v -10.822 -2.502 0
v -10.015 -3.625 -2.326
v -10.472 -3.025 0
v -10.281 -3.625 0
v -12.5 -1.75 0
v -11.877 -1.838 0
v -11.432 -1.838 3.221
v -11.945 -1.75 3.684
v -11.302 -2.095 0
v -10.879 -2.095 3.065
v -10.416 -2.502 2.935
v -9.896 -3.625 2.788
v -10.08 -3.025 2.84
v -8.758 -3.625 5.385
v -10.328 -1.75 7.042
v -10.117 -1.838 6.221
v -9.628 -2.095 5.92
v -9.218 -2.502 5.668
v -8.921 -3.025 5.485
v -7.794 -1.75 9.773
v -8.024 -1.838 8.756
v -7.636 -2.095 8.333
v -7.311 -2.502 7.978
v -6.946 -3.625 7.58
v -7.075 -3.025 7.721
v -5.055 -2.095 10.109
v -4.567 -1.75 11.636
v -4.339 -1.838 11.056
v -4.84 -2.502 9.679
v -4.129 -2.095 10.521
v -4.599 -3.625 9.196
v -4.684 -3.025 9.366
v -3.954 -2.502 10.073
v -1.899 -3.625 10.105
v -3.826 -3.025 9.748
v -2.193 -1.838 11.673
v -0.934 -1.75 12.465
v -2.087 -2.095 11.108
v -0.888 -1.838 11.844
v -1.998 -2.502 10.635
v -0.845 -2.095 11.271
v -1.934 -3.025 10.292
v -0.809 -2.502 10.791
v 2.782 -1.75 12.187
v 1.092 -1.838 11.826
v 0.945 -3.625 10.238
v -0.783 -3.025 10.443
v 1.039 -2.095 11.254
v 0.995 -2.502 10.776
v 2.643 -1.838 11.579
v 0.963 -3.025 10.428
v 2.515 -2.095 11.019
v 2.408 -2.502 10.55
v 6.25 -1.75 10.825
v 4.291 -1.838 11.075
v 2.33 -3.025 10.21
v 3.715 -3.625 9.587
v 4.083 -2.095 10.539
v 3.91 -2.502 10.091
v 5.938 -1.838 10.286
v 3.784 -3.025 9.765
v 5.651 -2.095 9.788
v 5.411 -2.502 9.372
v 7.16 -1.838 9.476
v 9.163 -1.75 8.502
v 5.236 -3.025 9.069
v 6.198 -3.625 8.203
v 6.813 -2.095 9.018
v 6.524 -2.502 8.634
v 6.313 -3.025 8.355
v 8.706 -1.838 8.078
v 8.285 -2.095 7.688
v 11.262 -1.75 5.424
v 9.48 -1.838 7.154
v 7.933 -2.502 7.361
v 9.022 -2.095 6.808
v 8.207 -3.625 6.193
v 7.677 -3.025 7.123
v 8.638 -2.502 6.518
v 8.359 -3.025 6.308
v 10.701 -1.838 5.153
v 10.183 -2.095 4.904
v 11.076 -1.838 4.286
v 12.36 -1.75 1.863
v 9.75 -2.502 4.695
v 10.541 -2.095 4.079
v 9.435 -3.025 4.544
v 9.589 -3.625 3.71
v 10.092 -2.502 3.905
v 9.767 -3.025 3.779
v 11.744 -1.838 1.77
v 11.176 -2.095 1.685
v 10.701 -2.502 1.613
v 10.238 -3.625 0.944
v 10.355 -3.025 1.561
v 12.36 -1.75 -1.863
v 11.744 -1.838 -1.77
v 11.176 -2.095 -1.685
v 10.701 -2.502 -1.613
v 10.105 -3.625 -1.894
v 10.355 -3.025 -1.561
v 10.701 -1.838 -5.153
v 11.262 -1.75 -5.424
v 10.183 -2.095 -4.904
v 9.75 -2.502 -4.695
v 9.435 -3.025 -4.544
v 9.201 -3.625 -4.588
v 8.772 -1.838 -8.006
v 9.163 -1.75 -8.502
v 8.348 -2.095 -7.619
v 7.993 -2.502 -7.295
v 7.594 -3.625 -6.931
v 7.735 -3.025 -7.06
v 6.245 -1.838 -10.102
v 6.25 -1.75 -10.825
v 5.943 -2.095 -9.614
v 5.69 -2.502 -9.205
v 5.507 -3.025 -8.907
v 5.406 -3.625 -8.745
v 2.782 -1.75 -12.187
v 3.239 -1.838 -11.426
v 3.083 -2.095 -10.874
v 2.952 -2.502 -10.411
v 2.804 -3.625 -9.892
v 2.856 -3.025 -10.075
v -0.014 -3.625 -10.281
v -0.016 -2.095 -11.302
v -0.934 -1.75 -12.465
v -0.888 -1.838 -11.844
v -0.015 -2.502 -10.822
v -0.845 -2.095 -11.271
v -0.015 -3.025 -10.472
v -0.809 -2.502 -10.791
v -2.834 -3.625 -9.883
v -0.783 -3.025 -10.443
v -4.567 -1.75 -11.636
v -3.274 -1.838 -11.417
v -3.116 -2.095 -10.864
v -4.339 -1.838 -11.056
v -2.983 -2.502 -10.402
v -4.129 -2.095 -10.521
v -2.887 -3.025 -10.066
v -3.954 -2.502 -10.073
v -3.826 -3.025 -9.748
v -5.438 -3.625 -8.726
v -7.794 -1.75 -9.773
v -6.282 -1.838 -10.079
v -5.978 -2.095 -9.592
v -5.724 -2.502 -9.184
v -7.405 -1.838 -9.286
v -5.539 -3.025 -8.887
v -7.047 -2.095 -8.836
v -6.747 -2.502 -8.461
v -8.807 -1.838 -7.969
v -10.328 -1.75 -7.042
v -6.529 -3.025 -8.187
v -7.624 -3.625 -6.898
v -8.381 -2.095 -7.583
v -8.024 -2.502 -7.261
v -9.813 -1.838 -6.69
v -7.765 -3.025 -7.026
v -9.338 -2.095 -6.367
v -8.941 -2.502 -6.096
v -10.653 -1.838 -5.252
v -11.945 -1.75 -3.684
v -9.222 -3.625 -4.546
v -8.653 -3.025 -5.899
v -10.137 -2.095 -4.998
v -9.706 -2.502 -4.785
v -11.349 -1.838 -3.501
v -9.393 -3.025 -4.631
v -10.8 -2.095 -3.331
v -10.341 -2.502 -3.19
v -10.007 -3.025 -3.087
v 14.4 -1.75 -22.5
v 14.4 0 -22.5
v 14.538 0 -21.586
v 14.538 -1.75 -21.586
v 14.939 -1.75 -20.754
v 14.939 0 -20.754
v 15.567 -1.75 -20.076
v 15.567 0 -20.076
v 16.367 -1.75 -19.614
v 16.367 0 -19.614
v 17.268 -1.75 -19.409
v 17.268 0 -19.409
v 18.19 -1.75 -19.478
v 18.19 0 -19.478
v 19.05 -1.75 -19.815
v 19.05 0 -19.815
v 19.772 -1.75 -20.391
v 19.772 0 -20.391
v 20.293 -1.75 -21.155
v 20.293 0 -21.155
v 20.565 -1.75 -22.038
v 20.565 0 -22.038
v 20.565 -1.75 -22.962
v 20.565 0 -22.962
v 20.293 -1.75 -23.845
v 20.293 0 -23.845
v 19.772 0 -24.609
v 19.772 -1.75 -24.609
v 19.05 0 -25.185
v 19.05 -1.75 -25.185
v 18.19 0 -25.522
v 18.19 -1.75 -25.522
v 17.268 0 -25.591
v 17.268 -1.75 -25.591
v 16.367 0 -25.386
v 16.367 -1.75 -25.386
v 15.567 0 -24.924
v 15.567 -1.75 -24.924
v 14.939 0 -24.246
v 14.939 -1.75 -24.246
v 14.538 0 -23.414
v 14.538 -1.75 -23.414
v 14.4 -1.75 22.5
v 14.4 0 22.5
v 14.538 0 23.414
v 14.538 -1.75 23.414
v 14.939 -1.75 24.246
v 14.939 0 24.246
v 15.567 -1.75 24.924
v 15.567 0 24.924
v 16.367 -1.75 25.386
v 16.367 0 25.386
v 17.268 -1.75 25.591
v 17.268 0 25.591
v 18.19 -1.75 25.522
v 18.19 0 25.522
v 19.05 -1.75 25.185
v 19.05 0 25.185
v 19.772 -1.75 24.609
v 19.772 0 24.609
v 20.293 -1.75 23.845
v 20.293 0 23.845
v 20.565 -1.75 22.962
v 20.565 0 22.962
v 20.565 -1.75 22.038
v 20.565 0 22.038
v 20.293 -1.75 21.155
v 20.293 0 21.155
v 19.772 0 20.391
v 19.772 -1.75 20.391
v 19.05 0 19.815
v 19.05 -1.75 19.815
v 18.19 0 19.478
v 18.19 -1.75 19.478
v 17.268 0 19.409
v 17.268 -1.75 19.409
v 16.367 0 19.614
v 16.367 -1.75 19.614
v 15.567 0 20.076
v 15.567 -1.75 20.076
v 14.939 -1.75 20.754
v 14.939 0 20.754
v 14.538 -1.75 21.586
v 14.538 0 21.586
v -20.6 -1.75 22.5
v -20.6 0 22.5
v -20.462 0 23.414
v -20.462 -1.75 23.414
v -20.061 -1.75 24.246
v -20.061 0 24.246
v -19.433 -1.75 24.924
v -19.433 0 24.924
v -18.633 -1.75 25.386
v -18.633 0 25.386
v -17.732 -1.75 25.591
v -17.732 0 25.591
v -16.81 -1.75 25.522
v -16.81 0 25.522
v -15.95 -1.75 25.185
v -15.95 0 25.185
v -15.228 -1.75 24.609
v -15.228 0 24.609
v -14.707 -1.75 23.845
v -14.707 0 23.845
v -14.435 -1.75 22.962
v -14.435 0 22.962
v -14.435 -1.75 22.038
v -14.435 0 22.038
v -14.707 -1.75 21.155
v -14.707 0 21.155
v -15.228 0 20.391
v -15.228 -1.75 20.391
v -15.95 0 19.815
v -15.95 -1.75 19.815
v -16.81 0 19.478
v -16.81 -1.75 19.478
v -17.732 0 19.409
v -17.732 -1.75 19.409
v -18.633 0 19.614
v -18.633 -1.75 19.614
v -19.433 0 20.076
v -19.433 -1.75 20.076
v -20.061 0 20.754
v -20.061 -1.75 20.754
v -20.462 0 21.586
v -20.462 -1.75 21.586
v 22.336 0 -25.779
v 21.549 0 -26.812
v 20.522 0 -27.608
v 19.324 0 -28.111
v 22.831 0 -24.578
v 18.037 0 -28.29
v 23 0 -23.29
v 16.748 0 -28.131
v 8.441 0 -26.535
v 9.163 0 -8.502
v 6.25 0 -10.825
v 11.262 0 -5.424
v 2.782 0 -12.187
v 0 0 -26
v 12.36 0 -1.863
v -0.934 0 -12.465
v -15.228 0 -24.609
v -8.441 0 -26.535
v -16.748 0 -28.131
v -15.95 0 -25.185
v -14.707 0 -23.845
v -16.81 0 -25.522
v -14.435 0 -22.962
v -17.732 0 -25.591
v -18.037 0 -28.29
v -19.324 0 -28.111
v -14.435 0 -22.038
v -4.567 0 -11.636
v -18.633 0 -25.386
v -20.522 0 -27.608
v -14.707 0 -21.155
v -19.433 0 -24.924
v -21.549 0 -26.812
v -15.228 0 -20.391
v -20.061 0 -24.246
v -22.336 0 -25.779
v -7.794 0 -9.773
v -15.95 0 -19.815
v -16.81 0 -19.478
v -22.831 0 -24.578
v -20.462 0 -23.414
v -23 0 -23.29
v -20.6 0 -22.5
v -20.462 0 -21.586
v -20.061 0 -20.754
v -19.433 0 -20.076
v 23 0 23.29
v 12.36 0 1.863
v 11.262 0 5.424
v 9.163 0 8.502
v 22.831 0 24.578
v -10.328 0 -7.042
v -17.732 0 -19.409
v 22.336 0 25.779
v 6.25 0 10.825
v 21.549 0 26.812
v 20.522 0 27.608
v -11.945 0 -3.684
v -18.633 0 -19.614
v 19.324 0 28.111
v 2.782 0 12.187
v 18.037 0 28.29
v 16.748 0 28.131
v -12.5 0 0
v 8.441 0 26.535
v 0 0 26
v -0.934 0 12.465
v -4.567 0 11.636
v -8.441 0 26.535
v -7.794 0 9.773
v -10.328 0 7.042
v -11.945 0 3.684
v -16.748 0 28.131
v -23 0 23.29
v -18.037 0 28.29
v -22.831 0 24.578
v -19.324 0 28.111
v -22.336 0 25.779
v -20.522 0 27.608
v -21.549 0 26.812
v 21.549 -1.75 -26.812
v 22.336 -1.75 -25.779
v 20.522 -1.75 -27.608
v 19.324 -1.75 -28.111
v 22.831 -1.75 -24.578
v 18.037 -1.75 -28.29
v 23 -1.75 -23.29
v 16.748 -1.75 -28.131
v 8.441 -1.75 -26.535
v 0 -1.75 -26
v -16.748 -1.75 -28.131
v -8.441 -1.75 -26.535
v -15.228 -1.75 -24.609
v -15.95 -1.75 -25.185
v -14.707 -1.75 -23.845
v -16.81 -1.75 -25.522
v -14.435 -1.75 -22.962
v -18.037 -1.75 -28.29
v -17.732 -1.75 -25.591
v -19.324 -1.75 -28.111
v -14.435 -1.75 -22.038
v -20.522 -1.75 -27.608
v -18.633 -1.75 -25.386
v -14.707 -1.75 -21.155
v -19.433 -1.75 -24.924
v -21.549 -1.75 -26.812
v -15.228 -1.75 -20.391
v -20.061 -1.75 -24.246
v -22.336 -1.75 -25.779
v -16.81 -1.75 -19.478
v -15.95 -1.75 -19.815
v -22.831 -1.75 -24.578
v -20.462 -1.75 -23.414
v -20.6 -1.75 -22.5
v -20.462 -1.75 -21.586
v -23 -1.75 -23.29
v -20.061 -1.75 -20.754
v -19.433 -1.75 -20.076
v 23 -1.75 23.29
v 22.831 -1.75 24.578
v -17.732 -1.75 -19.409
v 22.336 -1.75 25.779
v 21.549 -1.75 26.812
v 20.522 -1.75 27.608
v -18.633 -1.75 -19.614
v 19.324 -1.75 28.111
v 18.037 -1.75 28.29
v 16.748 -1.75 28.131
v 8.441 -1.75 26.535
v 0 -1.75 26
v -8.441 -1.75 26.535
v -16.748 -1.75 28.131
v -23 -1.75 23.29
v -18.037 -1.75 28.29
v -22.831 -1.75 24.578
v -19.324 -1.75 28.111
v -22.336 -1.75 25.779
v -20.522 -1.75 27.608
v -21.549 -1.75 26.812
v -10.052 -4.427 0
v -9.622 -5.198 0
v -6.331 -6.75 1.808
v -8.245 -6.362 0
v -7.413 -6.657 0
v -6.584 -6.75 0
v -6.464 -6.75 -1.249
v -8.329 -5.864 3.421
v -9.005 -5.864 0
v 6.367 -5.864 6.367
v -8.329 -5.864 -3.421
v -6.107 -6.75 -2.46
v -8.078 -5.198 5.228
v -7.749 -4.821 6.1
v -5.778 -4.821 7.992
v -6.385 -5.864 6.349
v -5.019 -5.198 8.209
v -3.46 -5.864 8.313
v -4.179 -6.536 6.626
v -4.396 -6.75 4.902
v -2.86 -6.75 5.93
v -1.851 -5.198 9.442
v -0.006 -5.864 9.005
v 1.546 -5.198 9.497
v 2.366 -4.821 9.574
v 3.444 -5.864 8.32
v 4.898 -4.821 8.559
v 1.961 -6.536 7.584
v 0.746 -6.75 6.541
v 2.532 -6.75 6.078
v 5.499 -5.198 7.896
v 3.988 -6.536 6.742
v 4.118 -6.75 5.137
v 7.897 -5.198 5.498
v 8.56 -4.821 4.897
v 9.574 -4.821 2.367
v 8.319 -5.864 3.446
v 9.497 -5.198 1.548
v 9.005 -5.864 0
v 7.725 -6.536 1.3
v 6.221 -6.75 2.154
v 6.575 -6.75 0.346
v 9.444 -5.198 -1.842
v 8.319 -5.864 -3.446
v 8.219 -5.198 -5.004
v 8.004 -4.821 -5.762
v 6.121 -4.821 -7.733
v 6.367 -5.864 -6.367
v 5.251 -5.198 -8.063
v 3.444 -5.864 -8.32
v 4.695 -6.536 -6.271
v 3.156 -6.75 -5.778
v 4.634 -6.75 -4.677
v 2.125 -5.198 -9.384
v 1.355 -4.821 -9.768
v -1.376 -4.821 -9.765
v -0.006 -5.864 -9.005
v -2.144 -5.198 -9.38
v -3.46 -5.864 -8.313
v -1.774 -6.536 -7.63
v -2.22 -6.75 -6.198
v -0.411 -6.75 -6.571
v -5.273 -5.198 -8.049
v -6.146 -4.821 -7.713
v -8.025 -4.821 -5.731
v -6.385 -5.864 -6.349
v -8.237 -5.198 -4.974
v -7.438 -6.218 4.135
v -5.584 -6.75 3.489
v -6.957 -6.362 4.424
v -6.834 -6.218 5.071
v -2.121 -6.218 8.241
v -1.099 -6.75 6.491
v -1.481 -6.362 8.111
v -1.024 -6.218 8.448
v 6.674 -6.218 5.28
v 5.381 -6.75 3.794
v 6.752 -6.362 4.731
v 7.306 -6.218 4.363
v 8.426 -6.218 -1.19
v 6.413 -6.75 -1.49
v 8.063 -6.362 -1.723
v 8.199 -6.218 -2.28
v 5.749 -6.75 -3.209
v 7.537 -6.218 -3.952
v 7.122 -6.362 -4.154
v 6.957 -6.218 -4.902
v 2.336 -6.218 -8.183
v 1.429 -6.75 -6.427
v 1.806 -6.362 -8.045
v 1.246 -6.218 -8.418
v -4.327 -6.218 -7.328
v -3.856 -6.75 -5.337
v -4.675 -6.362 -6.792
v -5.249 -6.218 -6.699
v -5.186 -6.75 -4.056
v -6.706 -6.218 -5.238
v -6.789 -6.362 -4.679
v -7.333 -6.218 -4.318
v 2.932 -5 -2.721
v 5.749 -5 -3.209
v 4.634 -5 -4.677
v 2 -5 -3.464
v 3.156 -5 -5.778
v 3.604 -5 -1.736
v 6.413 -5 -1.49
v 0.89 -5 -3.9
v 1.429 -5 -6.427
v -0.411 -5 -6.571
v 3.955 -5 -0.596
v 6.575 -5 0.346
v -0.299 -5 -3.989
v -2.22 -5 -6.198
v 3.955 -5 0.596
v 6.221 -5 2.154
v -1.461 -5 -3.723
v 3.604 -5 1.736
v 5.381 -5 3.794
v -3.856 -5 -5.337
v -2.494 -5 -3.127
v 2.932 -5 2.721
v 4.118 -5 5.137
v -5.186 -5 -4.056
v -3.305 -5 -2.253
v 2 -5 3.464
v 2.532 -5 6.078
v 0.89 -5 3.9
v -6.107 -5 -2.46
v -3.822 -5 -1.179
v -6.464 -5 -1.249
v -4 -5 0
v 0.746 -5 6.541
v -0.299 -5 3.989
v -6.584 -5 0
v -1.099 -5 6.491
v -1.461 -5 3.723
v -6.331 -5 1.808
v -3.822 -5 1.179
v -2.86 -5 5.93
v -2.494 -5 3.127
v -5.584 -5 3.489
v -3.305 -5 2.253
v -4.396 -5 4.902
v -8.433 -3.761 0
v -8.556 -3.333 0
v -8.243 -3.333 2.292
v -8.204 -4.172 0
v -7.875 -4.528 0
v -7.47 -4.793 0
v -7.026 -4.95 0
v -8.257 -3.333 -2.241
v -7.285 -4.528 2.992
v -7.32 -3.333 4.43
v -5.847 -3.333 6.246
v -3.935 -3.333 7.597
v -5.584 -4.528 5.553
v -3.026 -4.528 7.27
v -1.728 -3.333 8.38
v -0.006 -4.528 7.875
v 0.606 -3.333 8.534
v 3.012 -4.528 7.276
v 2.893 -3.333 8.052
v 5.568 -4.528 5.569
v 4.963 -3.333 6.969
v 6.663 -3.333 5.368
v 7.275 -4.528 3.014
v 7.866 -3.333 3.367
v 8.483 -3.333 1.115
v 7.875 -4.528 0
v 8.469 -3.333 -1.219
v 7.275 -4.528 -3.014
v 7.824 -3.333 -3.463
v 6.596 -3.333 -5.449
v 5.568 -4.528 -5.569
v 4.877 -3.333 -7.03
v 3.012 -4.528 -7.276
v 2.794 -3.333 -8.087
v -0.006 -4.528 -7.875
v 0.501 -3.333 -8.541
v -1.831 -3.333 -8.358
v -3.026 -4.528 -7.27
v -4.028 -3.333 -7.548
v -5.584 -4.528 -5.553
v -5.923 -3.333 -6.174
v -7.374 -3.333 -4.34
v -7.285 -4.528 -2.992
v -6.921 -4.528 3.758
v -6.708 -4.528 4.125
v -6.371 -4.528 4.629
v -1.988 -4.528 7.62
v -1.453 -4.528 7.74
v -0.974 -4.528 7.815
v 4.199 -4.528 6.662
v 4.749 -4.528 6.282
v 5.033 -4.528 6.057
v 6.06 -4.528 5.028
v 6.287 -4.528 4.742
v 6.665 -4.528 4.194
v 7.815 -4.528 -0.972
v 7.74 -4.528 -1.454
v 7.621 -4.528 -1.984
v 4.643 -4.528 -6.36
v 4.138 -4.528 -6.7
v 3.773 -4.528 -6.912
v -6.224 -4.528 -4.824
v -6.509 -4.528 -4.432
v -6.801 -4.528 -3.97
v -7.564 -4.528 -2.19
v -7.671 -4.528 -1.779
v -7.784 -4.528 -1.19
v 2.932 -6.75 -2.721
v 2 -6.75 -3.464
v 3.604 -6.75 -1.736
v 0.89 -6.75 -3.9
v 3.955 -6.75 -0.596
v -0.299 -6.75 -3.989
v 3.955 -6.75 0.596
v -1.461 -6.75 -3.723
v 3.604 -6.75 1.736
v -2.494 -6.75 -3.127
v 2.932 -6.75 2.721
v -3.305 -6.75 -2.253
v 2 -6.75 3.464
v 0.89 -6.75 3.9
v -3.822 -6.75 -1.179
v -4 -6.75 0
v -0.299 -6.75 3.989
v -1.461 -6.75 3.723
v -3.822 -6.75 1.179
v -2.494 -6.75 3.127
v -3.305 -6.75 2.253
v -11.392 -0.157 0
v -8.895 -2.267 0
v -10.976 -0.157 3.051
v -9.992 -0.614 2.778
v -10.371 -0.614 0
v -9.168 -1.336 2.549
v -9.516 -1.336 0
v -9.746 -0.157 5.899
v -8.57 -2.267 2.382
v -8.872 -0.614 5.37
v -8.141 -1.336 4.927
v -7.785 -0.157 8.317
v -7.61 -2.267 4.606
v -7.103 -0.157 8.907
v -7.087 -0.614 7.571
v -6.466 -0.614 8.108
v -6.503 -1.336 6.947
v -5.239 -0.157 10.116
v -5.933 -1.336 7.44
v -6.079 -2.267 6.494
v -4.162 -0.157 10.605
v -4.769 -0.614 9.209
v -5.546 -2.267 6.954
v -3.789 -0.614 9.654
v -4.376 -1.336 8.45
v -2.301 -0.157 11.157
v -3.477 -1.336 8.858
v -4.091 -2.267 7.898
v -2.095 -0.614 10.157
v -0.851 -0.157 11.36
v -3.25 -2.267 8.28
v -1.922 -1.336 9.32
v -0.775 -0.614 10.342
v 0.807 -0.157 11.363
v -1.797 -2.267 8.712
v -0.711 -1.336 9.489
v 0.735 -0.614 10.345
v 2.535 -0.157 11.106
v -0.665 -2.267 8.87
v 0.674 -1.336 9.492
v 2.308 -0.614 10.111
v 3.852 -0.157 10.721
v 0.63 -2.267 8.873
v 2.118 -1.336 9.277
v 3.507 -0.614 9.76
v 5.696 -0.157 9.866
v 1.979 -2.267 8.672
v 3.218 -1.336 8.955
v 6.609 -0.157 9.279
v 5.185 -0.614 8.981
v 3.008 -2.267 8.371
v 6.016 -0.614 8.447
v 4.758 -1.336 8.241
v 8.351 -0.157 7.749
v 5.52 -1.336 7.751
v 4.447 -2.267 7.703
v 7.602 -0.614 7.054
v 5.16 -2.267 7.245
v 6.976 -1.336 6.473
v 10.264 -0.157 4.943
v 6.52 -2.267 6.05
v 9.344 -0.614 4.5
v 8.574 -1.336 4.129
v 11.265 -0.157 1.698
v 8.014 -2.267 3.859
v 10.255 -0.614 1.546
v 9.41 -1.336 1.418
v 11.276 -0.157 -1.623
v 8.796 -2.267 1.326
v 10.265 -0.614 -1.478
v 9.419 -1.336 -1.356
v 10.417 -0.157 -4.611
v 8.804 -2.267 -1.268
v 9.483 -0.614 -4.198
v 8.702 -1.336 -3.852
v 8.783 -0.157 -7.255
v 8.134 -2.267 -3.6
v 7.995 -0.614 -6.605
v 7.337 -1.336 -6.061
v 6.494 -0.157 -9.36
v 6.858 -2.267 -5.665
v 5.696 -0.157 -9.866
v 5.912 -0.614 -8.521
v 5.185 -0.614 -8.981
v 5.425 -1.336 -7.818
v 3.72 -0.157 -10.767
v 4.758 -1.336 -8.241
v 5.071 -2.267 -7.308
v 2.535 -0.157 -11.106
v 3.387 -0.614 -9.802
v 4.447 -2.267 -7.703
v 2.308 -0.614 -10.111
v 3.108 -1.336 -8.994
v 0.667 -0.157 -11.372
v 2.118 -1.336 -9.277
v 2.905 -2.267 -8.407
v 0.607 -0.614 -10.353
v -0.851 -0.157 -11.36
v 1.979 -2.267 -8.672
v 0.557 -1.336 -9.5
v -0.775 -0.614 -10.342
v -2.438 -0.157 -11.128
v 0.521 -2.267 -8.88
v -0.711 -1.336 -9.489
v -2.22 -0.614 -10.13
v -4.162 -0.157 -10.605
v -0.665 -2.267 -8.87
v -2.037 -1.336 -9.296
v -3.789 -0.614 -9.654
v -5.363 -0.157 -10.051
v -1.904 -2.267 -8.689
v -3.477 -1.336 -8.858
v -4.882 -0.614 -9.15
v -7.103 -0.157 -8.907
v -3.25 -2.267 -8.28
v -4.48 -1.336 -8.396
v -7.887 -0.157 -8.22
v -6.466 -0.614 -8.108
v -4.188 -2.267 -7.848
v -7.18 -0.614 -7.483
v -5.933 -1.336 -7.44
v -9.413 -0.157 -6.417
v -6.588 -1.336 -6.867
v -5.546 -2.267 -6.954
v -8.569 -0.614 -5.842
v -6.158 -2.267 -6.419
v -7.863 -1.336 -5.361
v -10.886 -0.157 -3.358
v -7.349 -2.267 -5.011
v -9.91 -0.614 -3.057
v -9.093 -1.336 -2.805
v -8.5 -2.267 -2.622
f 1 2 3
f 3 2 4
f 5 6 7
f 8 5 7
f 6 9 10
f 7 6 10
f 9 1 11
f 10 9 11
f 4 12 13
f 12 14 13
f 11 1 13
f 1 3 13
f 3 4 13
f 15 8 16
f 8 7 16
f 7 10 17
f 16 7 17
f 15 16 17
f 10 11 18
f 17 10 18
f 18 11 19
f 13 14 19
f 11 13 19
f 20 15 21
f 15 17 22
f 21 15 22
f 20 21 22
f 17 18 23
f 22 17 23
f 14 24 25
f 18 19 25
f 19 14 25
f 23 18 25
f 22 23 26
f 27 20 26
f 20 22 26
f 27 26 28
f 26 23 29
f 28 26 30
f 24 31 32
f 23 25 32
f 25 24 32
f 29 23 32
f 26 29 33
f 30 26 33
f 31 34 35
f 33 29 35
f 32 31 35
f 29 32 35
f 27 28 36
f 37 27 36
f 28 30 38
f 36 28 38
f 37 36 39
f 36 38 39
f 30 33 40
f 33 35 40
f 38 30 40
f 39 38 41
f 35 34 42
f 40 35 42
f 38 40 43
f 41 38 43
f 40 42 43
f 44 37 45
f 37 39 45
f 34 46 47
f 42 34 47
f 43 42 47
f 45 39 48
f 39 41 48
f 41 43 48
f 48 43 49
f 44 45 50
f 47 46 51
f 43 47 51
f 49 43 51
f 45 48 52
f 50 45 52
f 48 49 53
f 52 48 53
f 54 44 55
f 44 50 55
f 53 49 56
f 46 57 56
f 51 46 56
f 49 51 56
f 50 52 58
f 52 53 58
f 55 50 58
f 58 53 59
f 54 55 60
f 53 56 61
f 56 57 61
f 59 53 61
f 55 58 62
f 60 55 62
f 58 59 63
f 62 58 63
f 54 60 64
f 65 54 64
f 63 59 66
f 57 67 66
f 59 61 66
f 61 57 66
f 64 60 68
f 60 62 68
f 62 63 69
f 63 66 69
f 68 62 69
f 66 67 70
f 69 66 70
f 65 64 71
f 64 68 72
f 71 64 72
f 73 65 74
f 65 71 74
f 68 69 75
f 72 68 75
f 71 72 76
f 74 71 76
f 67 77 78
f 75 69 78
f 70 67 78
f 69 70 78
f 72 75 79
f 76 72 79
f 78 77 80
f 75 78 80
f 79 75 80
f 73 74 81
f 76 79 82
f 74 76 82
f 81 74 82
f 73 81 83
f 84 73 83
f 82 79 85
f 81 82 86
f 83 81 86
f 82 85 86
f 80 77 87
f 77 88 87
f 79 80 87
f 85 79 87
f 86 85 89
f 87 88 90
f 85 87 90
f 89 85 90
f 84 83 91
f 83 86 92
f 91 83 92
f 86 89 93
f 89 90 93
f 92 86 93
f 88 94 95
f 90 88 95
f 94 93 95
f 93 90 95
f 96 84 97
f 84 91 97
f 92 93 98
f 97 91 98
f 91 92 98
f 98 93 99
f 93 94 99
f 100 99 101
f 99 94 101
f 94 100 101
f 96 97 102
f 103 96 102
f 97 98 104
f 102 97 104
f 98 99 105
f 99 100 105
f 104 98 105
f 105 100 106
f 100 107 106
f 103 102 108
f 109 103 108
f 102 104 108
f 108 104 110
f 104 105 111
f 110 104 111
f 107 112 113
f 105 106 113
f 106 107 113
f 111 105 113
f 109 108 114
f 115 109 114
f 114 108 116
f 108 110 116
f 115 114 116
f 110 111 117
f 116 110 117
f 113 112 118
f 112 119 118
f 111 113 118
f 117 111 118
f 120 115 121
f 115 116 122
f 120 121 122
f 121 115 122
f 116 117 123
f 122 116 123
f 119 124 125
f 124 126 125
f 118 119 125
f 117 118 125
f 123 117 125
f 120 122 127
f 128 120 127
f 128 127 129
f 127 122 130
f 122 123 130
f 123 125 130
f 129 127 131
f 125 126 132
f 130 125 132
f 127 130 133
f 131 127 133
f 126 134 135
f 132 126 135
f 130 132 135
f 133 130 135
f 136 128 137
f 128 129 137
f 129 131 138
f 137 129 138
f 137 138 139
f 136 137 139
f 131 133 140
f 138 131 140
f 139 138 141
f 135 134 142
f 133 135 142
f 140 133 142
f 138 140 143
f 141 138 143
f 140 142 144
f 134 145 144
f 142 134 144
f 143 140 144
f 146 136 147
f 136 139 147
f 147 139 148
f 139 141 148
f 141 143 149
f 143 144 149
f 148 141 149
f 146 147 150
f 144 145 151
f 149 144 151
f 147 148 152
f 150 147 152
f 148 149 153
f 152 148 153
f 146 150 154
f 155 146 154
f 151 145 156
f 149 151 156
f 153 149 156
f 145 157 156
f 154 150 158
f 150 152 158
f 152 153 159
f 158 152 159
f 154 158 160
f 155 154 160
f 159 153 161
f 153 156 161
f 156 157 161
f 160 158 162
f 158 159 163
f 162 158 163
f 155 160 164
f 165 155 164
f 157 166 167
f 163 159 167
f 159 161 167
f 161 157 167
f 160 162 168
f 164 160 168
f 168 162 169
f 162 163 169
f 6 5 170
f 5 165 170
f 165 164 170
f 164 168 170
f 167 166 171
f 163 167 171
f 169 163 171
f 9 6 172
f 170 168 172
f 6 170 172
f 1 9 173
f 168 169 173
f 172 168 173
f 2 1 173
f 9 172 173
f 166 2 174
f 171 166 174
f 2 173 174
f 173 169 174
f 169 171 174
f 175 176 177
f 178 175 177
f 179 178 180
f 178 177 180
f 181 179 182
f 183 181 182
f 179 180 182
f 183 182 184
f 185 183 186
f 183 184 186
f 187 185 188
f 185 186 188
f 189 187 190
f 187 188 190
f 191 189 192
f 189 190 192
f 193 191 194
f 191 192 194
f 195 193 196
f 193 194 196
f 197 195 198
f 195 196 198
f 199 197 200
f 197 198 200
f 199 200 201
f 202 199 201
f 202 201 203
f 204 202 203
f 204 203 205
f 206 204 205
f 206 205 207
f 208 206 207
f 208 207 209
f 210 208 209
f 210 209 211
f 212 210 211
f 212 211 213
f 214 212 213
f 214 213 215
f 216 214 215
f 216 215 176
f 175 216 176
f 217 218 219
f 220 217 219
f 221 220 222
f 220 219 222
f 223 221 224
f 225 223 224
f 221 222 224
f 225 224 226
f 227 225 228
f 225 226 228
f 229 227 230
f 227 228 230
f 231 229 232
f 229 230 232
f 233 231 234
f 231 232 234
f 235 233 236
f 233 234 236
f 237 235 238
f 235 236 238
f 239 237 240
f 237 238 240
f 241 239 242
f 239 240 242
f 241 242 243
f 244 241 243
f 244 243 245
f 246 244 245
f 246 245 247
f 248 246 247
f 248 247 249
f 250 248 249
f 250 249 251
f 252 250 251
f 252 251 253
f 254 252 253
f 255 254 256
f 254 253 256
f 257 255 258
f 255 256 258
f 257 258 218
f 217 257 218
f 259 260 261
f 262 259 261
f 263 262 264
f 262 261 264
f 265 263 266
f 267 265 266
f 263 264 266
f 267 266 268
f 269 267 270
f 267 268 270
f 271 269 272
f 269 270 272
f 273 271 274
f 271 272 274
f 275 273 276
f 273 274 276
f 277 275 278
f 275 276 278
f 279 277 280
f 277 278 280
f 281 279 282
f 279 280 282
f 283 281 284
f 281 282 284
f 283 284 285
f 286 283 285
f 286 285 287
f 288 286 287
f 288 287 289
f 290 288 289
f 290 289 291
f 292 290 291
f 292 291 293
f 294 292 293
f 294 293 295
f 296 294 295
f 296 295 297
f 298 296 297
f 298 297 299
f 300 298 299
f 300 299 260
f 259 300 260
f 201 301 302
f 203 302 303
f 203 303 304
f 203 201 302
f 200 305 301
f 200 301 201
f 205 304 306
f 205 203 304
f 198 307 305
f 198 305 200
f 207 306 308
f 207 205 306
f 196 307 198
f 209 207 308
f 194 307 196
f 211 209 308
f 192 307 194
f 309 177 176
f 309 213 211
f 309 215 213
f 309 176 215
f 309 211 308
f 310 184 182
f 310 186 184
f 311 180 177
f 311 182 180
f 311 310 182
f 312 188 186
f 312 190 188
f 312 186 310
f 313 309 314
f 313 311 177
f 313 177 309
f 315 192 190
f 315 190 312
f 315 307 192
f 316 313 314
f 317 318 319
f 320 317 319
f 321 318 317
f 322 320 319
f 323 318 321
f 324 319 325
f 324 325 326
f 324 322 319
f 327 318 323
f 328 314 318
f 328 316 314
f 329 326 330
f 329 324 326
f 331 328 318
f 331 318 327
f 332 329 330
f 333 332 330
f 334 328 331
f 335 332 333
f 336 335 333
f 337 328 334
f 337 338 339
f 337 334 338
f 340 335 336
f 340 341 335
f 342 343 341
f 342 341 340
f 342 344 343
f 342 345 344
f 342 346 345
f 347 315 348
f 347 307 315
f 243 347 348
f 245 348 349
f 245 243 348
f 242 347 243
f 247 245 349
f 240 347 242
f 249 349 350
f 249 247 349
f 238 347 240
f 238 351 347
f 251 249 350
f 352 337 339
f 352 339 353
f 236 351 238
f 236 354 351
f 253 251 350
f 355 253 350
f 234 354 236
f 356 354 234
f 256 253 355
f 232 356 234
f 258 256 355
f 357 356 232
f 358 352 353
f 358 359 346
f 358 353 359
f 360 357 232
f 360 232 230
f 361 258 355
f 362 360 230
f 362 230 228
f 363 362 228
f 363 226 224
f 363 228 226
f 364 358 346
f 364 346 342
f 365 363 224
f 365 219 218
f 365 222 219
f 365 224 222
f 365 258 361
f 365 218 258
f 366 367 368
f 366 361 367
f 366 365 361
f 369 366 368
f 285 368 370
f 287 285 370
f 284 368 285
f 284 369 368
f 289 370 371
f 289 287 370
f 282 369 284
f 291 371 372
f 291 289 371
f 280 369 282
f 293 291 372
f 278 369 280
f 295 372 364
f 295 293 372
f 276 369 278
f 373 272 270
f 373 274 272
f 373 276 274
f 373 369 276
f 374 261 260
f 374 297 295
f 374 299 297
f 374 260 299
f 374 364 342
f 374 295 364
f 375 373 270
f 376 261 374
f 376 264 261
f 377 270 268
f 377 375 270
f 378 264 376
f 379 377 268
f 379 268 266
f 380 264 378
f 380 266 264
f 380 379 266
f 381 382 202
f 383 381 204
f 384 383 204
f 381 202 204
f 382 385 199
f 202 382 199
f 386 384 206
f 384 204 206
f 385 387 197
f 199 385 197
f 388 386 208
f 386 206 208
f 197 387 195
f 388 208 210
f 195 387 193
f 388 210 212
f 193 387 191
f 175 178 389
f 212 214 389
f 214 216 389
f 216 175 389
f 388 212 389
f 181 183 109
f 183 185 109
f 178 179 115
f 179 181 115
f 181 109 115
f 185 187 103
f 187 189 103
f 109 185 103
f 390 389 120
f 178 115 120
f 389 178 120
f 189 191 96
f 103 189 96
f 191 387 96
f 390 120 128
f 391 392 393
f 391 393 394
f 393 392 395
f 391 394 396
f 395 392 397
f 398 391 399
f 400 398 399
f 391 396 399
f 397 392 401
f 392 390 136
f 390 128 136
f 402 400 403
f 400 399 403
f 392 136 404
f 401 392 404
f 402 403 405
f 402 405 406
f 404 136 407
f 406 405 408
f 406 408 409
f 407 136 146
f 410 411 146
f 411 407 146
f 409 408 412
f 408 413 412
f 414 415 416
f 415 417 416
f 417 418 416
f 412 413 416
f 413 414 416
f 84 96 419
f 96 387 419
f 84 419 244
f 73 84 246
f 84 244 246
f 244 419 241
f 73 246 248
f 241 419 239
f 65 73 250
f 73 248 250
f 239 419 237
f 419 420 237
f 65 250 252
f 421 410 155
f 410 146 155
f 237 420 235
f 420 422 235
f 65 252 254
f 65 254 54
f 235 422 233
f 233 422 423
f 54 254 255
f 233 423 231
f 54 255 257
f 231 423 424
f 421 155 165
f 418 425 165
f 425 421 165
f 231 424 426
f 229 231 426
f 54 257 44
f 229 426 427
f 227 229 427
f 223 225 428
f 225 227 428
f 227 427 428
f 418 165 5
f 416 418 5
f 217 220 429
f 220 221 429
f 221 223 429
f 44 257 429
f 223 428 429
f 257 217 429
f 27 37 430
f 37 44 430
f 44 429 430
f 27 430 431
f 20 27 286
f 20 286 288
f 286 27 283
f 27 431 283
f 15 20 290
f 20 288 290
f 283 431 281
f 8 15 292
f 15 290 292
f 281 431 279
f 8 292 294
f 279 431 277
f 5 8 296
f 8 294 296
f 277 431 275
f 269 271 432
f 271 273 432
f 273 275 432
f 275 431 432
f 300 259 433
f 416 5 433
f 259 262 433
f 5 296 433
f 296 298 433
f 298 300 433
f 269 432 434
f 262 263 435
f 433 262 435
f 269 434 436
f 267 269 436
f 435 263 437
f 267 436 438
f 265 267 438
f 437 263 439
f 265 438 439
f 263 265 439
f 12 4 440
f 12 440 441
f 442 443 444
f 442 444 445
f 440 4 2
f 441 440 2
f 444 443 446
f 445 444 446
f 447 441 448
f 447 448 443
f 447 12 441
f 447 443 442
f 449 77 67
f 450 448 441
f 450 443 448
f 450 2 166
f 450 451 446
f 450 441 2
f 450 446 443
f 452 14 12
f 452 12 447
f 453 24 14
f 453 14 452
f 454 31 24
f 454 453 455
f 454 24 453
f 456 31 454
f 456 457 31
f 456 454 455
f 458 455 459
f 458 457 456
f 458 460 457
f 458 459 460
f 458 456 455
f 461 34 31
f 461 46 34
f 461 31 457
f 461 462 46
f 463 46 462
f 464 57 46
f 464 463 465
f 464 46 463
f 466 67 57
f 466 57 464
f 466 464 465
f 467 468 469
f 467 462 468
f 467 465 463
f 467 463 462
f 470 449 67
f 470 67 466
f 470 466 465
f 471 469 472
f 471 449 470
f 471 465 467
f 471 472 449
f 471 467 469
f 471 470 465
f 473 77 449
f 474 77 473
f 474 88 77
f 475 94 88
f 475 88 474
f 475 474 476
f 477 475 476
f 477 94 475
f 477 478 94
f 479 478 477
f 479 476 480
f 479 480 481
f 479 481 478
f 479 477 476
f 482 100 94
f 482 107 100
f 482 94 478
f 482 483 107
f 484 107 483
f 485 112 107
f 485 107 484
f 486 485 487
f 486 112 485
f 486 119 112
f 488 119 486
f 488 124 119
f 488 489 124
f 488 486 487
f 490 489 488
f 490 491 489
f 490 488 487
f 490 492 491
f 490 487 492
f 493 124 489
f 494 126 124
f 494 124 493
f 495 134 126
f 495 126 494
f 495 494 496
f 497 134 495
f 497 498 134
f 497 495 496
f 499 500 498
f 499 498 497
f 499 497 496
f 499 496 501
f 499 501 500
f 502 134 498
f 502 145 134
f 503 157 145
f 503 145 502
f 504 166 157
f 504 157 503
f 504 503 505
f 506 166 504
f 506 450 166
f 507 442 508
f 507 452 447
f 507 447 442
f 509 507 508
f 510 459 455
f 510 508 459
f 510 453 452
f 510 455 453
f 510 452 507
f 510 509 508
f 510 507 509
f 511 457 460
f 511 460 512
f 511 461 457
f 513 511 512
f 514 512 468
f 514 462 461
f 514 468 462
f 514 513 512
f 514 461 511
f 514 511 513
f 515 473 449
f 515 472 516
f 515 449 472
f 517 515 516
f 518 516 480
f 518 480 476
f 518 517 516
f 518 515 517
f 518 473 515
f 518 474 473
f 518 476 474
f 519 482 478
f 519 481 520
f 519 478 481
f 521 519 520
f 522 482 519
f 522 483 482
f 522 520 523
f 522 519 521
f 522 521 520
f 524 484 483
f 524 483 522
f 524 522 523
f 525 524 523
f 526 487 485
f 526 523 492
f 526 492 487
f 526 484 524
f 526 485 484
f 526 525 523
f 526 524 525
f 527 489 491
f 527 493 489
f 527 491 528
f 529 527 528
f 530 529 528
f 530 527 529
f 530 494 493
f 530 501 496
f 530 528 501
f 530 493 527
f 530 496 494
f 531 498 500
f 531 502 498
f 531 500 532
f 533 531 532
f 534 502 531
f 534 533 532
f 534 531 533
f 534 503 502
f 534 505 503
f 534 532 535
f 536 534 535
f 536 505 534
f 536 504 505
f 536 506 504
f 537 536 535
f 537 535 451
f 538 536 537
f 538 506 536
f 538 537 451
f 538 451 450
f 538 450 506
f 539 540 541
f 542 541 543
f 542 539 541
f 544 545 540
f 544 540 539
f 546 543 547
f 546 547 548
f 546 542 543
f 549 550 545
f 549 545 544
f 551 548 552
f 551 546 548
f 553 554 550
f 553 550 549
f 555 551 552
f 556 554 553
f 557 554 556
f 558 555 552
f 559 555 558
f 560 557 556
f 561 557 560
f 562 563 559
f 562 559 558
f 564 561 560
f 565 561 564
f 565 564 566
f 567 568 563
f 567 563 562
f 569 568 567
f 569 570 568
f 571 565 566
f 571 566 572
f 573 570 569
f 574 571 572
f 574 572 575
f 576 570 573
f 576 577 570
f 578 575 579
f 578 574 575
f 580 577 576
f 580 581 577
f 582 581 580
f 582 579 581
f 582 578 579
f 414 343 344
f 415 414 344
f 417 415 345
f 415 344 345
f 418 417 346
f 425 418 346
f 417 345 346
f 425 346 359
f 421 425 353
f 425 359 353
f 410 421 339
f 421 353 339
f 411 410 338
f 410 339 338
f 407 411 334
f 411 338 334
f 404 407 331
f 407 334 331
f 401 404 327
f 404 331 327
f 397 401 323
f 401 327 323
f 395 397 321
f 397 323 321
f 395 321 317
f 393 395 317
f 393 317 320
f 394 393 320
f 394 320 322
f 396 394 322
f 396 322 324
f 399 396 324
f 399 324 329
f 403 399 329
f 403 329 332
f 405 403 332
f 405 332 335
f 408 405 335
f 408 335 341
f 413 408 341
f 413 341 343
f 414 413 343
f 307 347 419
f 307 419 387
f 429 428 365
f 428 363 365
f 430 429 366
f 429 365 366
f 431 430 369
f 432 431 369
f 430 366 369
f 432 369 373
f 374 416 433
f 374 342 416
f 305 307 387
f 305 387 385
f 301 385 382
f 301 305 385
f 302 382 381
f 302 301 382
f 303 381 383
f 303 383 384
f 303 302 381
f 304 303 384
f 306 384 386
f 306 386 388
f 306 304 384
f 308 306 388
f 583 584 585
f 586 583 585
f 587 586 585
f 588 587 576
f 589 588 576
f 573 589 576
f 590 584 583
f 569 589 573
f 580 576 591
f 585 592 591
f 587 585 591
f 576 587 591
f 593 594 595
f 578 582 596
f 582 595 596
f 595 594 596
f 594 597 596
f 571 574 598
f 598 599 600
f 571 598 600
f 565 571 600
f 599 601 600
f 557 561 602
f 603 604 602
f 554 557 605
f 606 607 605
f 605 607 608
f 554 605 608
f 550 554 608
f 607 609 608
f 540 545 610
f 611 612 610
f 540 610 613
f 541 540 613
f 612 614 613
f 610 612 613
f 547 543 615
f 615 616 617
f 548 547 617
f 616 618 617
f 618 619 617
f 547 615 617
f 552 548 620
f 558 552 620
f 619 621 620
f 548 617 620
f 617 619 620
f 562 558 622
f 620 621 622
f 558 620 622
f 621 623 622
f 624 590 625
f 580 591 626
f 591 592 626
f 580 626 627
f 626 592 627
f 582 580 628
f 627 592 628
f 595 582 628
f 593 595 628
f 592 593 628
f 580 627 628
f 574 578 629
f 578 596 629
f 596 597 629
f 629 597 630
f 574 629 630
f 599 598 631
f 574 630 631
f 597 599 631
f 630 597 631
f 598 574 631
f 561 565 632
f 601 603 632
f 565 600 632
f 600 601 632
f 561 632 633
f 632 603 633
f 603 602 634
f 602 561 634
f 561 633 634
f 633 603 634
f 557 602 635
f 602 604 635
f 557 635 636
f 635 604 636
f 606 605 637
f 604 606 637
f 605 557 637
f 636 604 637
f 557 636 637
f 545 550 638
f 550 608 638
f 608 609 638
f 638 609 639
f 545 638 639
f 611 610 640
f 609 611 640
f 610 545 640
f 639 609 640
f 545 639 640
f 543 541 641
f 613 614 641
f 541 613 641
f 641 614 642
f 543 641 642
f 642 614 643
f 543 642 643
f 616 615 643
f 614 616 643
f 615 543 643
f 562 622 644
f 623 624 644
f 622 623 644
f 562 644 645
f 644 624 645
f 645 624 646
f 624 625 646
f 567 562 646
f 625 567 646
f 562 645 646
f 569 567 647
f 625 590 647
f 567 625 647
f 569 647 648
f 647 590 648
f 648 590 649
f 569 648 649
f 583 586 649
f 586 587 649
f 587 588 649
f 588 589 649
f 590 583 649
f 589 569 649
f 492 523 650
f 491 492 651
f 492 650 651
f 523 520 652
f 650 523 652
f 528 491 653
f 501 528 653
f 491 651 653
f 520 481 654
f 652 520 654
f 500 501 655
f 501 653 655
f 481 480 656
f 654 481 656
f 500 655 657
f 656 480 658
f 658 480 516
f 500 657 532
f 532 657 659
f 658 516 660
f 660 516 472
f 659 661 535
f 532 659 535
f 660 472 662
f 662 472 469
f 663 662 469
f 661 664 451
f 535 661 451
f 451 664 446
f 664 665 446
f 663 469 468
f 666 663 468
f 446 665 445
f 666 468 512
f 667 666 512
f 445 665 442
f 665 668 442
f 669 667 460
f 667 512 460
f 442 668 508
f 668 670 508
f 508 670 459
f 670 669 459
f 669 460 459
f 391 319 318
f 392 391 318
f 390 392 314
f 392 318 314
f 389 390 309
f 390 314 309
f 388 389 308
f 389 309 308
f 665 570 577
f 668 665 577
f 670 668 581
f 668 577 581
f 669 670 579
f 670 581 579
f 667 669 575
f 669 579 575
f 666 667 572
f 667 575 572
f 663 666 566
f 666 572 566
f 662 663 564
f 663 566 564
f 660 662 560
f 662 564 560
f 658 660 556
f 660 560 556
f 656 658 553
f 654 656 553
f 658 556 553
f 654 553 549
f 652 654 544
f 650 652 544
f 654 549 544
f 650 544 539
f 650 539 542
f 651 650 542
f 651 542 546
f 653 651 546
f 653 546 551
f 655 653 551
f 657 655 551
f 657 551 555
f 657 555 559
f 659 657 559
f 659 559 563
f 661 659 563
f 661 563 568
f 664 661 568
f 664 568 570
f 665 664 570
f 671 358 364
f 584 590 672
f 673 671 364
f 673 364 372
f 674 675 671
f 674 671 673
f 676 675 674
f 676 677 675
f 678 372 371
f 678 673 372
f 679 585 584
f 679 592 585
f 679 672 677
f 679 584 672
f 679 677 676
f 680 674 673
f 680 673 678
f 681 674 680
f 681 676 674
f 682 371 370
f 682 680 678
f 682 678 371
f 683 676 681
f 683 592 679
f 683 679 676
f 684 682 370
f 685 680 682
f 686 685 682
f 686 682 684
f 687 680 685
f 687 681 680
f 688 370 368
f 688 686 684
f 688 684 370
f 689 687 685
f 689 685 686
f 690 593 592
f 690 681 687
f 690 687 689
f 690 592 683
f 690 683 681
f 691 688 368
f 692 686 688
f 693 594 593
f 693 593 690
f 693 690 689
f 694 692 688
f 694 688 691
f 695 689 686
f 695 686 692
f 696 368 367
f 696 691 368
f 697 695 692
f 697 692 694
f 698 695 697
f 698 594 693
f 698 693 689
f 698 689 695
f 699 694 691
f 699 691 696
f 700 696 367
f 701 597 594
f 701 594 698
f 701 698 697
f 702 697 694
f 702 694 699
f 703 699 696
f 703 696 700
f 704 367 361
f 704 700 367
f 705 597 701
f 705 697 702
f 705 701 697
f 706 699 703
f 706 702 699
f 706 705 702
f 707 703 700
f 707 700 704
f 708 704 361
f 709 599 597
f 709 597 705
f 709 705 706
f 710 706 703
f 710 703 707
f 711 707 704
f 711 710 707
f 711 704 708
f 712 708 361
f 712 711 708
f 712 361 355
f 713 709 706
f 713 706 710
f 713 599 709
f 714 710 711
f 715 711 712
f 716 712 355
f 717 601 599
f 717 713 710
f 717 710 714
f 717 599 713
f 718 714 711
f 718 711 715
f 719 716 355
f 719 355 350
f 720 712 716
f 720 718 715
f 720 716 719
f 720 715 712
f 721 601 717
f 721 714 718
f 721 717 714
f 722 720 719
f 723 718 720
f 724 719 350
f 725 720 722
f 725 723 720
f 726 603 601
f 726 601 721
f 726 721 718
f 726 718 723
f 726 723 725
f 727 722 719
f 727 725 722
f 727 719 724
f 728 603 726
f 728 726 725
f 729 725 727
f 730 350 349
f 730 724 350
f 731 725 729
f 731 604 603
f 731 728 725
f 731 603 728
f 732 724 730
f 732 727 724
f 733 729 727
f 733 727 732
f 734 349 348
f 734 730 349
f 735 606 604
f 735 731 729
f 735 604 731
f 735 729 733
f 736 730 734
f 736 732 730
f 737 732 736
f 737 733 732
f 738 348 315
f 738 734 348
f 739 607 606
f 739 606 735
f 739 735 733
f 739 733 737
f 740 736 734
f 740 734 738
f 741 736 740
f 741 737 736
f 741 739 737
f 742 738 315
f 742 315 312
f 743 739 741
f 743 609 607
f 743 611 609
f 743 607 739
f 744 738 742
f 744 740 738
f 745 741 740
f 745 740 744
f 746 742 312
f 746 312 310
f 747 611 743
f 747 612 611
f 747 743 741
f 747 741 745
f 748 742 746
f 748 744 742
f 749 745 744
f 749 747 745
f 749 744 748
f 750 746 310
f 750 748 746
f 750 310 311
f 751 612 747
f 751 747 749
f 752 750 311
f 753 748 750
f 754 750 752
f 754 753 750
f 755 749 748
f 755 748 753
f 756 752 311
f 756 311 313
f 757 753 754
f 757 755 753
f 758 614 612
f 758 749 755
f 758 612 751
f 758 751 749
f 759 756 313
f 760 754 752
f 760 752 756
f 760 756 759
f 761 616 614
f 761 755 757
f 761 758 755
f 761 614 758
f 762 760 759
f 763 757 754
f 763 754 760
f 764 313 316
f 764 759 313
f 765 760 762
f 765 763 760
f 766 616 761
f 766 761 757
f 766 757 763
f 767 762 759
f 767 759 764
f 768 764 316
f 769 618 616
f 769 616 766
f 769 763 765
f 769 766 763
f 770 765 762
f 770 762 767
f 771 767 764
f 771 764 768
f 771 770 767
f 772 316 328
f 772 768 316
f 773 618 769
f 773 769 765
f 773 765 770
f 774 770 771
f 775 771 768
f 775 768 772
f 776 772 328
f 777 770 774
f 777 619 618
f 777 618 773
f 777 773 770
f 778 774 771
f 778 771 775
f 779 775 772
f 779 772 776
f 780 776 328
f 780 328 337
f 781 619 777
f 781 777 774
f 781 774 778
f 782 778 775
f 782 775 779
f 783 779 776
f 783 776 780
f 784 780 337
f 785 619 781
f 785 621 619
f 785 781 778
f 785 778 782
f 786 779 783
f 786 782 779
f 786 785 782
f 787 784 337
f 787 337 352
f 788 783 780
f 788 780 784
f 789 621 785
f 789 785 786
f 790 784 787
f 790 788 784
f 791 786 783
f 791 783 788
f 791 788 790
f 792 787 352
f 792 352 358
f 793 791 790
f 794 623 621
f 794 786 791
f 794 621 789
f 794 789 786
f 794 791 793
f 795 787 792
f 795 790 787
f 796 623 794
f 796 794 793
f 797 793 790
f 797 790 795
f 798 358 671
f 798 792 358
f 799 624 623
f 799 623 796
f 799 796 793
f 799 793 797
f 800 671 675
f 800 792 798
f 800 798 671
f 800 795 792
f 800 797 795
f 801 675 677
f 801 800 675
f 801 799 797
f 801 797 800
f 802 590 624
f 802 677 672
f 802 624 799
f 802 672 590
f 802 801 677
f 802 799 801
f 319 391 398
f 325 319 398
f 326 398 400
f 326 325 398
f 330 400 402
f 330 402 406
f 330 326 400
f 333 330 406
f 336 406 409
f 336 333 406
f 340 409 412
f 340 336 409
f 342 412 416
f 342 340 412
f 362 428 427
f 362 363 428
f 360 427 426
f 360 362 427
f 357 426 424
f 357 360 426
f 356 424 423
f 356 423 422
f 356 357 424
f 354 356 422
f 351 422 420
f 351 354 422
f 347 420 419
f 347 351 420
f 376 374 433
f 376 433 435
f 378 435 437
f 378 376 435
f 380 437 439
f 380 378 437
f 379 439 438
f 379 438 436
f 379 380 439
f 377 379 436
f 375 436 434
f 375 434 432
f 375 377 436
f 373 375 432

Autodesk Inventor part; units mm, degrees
ref_plane "YZ Plane" through (0, 0, 0) normal (1, 0, 0) x (0, 1, 0)
ref_plane "XZ Plane" through (0, 0, 0) normal (0, 1, 0) x (-1, 0, 0)
ref_plane "XY Plane" through (0, 0, 0) normal (0, 0, 1) x (1, 0, 0)
sketch "Sketch1" plane through (0, 0, 0) normal (0, 1, 0) x (-1, 0, 0)
  line L0 (-23, 23.29) -> (-23, -23.29)
  line L1 (23, -23.29) -> (23, 23.29)
  line L2 (0, 0) -> (0, -50.5577)
  line L3 (0, 0) -> (-7.5284, 0)
  arc A0 (16.748, -28.1307) -> (-16.748, -28.1307) centre (0, -92.8874) ccw
  arc A1 (-16.748, 28.1307) -> (16.748, 28.1307) centre (0, 92.8874) ccw
  arc A2 (-16.748, 28.1307) -> (-23, 23.29) centre (-18, 23.29) ccw
  arc A3 (-23, -23.29) -> (-16.748, -28.1307) centre (-18, -23.29) ccw
  arc A4 (16.748, -28.1307) -> (23, -23.29) centre (18, -23.29) ccw
  arc A5 (23, 23.29) -> (16.748, 28.1307) centre (18, 23.29) ccw
  line L4 (61.758, -28.29) -> (80.0321, -28.29)
  line L5 (64.4221, 28.29) -> (84.7267, 28.29)
  circle A6 centre (-17.5, -22.5) radius 3.1
  circle A7 centre (17.5, 22.5) radius 3.1
  circle A8 centre (17.5, -22.5) radius 3.1
  circle A9 centre (-17.5, 22.5) radius 3.1
  circle A10 centre (0, 0) radius 8.5
  circle A11 centre (0, 0) radius 4
  dimension "d0" = 52
  dimension "d1" = 46
  dimension "d2" = 5
  dimension "d3" = 56.58
  dimension "d4" = 45
  dimension "d5" = 35
  dimension "d6" = 6.2
  dimension "d9" = 17
  dimension "d15" = 8
extrude "Extrusion1" add sketch "Sketch1" against normal blind 10 contours A2 A1 A5 L1 A4 A0 A3 L0 | L3 A11 L2 | L2 A11 L3 | A6 | A7 | A8 | A9 | A10
extrude "Extrusion2" cut sketch "Sketch1" against normal blind 5 contours L3 A11 L2 | L2 A11 L3 | A10
fillet "Fillet1" radius 4 1 edges at (8.5, 0, 0)
fillet "Fillet2" radius 2 1 edges at (8.5, -5, 0)
shell "Shell1" thickness 1.75 removed faces 9 at (11.424, -10, -7.7633) at (22.3091, -6.6667, 25.8261) at (17.1192, -6.6667, -28.2118) at (-13.0815, -3.3333, 27.2917) at (-13.0815, -6.6667, -27.2917) at (-22.1041, -6.6667, 26.146) at (-22.3091, -6.6667, -25.8261) at (-23, -3.3333, -7.7633) at (23, -3.3333, 7.7633)
extrude "Extrusion3" cut sketch "Sketch1" against normal through all contours L3 A11 L2 | L2 A11 L3 | A6 | A7 | A8 | A9
equation "\"d15\" = 2 * d25"
equation "\"d25\" = 4"
properties part number "Wheel 75 mm - Part 6"
